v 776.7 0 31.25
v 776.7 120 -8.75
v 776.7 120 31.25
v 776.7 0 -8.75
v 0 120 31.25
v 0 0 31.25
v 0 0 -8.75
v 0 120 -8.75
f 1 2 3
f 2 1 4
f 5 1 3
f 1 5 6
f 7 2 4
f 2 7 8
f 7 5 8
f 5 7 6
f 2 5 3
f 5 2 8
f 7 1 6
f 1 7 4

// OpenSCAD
$fn = 100; 

module trackerLogo(thickness) {
  dxfScale = 100;
  difference() {
   cube([7.767 * dxfScale, 1.2 * dxfScale, thickness]);
    translate ([-.01,-.01,-.01]) {
      linear_extrude(height = thickness * 2, convexity = 5) 
      import(file = "/Users/andy/Dropbox/Things/tracker-logo/logo.dxf");
		}
	}
}

armThickness = 8;
armWidth = 22.5;
thickness = 40;
upperCaseTop = 85.7;
lowerCaseTop = 69.5;
baseline = 31;
middleUpper = upperCaseTop - ((upperCaseTop - baseline) / 2);
middleLower = lowerCaseTop - ((lowerCaseTop - baseline) / 2);

module support() {
  union() {
    translate([0, 0, 0]) cube([armThickness, 30, armWidth]);
    translate([0, 28, 0]) rotate([0, 0, 57]) cube([armThickness, 20, armWidth]);
    translate([0, 30, 0]) rotate([0, 0, -57]) cube([armThickness, 20, armWidth]);
  }
}

module arm(length = 20, xSize = armThickness, zSize = armWidth) {
  translate([0, -xSize/2 + 2.5, 0]) 
  cube([length, xSize, zSize]);
}

// Logo
translate([0, 0, (armWidth - thickness)/2]) trackerLogo(thickness);

// Icon Support
translate([60, 112, armWidth]) rotate([180, 0, 0]) support();
translate([60, 10, 0]) support();
// P Support
translate([115, middleLower, 0]) arm(25, 20);
// I Support
translate([168, middleLower+5, 0]) arm(30, 10);
translate([145, middleLower-4, 0]) arm(50, 11.5);
// Dot Support
translate([198.78, lowerCaseTop, 0]) 
rotate([0, 0, 90]) arm();
// V Support
translate([191, middleLower, 0]) arm(37, 20);
// O Support
translate([245, middleLower, 0]) arm(25, 20);
// T Support
translate([308, middleLower, 0]) arm(20, 20);
// A Support
translate([330, middleLower, 0]) arm(20, 20);
// L Support
translate([397, middleLower, 0]) arm(20, 20);
// T Support
translate([420, middleLower, 0]) arm(40, 20);
// R Support
translate([465, middleLower, 0]) arm(40, 20);
// A Support
translate([505, middleLower, 0]) arm(25, 20);
// C Support
translate([575, middleLower, 0]) arm(20, 20);
// K Support
translate([630, 66.5, 0]) arm();
translate([622, baseline, 0]) arm();
// E Support
translate([650, middleLower, 0]) arm(50, 20);
// R Support
translate([731, middleLower+10, 0]) arm(20, 20);
translate([727, middleLower-19, 0]) arm(20, 8);
